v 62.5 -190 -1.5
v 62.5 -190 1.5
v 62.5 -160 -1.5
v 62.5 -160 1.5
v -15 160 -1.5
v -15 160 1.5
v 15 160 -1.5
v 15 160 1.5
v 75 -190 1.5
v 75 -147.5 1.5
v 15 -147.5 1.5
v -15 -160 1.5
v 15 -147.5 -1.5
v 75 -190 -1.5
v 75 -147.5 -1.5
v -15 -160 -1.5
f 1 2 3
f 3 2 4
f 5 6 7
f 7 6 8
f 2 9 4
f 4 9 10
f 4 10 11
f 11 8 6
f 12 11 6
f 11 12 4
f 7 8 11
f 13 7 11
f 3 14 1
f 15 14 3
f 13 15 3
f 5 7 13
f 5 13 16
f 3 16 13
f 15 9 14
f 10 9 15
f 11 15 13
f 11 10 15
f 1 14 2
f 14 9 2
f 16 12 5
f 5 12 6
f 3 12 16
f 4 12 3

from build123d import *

# Parameters (mm, degrees)
BOSS_EXTRUDE1_DEPTH = 1.5


with BuildPart() as part:
    # Sketch1 → Boss-Extrude1 (new body, symmetric)
    with BuildSketch(Plane.XY):
        Polygon((65, -147.5), (75, -147.5), (75, -160), (75, -190), (62.5, -190), (62.5, -160), (15, -160), (-15, -160), (-15, 160), (15, 160), (15, -147.5), align=None)
    extrude(amount=BOSS_EXTRUDE1_DEPTH, both=True)


solid = part.part
